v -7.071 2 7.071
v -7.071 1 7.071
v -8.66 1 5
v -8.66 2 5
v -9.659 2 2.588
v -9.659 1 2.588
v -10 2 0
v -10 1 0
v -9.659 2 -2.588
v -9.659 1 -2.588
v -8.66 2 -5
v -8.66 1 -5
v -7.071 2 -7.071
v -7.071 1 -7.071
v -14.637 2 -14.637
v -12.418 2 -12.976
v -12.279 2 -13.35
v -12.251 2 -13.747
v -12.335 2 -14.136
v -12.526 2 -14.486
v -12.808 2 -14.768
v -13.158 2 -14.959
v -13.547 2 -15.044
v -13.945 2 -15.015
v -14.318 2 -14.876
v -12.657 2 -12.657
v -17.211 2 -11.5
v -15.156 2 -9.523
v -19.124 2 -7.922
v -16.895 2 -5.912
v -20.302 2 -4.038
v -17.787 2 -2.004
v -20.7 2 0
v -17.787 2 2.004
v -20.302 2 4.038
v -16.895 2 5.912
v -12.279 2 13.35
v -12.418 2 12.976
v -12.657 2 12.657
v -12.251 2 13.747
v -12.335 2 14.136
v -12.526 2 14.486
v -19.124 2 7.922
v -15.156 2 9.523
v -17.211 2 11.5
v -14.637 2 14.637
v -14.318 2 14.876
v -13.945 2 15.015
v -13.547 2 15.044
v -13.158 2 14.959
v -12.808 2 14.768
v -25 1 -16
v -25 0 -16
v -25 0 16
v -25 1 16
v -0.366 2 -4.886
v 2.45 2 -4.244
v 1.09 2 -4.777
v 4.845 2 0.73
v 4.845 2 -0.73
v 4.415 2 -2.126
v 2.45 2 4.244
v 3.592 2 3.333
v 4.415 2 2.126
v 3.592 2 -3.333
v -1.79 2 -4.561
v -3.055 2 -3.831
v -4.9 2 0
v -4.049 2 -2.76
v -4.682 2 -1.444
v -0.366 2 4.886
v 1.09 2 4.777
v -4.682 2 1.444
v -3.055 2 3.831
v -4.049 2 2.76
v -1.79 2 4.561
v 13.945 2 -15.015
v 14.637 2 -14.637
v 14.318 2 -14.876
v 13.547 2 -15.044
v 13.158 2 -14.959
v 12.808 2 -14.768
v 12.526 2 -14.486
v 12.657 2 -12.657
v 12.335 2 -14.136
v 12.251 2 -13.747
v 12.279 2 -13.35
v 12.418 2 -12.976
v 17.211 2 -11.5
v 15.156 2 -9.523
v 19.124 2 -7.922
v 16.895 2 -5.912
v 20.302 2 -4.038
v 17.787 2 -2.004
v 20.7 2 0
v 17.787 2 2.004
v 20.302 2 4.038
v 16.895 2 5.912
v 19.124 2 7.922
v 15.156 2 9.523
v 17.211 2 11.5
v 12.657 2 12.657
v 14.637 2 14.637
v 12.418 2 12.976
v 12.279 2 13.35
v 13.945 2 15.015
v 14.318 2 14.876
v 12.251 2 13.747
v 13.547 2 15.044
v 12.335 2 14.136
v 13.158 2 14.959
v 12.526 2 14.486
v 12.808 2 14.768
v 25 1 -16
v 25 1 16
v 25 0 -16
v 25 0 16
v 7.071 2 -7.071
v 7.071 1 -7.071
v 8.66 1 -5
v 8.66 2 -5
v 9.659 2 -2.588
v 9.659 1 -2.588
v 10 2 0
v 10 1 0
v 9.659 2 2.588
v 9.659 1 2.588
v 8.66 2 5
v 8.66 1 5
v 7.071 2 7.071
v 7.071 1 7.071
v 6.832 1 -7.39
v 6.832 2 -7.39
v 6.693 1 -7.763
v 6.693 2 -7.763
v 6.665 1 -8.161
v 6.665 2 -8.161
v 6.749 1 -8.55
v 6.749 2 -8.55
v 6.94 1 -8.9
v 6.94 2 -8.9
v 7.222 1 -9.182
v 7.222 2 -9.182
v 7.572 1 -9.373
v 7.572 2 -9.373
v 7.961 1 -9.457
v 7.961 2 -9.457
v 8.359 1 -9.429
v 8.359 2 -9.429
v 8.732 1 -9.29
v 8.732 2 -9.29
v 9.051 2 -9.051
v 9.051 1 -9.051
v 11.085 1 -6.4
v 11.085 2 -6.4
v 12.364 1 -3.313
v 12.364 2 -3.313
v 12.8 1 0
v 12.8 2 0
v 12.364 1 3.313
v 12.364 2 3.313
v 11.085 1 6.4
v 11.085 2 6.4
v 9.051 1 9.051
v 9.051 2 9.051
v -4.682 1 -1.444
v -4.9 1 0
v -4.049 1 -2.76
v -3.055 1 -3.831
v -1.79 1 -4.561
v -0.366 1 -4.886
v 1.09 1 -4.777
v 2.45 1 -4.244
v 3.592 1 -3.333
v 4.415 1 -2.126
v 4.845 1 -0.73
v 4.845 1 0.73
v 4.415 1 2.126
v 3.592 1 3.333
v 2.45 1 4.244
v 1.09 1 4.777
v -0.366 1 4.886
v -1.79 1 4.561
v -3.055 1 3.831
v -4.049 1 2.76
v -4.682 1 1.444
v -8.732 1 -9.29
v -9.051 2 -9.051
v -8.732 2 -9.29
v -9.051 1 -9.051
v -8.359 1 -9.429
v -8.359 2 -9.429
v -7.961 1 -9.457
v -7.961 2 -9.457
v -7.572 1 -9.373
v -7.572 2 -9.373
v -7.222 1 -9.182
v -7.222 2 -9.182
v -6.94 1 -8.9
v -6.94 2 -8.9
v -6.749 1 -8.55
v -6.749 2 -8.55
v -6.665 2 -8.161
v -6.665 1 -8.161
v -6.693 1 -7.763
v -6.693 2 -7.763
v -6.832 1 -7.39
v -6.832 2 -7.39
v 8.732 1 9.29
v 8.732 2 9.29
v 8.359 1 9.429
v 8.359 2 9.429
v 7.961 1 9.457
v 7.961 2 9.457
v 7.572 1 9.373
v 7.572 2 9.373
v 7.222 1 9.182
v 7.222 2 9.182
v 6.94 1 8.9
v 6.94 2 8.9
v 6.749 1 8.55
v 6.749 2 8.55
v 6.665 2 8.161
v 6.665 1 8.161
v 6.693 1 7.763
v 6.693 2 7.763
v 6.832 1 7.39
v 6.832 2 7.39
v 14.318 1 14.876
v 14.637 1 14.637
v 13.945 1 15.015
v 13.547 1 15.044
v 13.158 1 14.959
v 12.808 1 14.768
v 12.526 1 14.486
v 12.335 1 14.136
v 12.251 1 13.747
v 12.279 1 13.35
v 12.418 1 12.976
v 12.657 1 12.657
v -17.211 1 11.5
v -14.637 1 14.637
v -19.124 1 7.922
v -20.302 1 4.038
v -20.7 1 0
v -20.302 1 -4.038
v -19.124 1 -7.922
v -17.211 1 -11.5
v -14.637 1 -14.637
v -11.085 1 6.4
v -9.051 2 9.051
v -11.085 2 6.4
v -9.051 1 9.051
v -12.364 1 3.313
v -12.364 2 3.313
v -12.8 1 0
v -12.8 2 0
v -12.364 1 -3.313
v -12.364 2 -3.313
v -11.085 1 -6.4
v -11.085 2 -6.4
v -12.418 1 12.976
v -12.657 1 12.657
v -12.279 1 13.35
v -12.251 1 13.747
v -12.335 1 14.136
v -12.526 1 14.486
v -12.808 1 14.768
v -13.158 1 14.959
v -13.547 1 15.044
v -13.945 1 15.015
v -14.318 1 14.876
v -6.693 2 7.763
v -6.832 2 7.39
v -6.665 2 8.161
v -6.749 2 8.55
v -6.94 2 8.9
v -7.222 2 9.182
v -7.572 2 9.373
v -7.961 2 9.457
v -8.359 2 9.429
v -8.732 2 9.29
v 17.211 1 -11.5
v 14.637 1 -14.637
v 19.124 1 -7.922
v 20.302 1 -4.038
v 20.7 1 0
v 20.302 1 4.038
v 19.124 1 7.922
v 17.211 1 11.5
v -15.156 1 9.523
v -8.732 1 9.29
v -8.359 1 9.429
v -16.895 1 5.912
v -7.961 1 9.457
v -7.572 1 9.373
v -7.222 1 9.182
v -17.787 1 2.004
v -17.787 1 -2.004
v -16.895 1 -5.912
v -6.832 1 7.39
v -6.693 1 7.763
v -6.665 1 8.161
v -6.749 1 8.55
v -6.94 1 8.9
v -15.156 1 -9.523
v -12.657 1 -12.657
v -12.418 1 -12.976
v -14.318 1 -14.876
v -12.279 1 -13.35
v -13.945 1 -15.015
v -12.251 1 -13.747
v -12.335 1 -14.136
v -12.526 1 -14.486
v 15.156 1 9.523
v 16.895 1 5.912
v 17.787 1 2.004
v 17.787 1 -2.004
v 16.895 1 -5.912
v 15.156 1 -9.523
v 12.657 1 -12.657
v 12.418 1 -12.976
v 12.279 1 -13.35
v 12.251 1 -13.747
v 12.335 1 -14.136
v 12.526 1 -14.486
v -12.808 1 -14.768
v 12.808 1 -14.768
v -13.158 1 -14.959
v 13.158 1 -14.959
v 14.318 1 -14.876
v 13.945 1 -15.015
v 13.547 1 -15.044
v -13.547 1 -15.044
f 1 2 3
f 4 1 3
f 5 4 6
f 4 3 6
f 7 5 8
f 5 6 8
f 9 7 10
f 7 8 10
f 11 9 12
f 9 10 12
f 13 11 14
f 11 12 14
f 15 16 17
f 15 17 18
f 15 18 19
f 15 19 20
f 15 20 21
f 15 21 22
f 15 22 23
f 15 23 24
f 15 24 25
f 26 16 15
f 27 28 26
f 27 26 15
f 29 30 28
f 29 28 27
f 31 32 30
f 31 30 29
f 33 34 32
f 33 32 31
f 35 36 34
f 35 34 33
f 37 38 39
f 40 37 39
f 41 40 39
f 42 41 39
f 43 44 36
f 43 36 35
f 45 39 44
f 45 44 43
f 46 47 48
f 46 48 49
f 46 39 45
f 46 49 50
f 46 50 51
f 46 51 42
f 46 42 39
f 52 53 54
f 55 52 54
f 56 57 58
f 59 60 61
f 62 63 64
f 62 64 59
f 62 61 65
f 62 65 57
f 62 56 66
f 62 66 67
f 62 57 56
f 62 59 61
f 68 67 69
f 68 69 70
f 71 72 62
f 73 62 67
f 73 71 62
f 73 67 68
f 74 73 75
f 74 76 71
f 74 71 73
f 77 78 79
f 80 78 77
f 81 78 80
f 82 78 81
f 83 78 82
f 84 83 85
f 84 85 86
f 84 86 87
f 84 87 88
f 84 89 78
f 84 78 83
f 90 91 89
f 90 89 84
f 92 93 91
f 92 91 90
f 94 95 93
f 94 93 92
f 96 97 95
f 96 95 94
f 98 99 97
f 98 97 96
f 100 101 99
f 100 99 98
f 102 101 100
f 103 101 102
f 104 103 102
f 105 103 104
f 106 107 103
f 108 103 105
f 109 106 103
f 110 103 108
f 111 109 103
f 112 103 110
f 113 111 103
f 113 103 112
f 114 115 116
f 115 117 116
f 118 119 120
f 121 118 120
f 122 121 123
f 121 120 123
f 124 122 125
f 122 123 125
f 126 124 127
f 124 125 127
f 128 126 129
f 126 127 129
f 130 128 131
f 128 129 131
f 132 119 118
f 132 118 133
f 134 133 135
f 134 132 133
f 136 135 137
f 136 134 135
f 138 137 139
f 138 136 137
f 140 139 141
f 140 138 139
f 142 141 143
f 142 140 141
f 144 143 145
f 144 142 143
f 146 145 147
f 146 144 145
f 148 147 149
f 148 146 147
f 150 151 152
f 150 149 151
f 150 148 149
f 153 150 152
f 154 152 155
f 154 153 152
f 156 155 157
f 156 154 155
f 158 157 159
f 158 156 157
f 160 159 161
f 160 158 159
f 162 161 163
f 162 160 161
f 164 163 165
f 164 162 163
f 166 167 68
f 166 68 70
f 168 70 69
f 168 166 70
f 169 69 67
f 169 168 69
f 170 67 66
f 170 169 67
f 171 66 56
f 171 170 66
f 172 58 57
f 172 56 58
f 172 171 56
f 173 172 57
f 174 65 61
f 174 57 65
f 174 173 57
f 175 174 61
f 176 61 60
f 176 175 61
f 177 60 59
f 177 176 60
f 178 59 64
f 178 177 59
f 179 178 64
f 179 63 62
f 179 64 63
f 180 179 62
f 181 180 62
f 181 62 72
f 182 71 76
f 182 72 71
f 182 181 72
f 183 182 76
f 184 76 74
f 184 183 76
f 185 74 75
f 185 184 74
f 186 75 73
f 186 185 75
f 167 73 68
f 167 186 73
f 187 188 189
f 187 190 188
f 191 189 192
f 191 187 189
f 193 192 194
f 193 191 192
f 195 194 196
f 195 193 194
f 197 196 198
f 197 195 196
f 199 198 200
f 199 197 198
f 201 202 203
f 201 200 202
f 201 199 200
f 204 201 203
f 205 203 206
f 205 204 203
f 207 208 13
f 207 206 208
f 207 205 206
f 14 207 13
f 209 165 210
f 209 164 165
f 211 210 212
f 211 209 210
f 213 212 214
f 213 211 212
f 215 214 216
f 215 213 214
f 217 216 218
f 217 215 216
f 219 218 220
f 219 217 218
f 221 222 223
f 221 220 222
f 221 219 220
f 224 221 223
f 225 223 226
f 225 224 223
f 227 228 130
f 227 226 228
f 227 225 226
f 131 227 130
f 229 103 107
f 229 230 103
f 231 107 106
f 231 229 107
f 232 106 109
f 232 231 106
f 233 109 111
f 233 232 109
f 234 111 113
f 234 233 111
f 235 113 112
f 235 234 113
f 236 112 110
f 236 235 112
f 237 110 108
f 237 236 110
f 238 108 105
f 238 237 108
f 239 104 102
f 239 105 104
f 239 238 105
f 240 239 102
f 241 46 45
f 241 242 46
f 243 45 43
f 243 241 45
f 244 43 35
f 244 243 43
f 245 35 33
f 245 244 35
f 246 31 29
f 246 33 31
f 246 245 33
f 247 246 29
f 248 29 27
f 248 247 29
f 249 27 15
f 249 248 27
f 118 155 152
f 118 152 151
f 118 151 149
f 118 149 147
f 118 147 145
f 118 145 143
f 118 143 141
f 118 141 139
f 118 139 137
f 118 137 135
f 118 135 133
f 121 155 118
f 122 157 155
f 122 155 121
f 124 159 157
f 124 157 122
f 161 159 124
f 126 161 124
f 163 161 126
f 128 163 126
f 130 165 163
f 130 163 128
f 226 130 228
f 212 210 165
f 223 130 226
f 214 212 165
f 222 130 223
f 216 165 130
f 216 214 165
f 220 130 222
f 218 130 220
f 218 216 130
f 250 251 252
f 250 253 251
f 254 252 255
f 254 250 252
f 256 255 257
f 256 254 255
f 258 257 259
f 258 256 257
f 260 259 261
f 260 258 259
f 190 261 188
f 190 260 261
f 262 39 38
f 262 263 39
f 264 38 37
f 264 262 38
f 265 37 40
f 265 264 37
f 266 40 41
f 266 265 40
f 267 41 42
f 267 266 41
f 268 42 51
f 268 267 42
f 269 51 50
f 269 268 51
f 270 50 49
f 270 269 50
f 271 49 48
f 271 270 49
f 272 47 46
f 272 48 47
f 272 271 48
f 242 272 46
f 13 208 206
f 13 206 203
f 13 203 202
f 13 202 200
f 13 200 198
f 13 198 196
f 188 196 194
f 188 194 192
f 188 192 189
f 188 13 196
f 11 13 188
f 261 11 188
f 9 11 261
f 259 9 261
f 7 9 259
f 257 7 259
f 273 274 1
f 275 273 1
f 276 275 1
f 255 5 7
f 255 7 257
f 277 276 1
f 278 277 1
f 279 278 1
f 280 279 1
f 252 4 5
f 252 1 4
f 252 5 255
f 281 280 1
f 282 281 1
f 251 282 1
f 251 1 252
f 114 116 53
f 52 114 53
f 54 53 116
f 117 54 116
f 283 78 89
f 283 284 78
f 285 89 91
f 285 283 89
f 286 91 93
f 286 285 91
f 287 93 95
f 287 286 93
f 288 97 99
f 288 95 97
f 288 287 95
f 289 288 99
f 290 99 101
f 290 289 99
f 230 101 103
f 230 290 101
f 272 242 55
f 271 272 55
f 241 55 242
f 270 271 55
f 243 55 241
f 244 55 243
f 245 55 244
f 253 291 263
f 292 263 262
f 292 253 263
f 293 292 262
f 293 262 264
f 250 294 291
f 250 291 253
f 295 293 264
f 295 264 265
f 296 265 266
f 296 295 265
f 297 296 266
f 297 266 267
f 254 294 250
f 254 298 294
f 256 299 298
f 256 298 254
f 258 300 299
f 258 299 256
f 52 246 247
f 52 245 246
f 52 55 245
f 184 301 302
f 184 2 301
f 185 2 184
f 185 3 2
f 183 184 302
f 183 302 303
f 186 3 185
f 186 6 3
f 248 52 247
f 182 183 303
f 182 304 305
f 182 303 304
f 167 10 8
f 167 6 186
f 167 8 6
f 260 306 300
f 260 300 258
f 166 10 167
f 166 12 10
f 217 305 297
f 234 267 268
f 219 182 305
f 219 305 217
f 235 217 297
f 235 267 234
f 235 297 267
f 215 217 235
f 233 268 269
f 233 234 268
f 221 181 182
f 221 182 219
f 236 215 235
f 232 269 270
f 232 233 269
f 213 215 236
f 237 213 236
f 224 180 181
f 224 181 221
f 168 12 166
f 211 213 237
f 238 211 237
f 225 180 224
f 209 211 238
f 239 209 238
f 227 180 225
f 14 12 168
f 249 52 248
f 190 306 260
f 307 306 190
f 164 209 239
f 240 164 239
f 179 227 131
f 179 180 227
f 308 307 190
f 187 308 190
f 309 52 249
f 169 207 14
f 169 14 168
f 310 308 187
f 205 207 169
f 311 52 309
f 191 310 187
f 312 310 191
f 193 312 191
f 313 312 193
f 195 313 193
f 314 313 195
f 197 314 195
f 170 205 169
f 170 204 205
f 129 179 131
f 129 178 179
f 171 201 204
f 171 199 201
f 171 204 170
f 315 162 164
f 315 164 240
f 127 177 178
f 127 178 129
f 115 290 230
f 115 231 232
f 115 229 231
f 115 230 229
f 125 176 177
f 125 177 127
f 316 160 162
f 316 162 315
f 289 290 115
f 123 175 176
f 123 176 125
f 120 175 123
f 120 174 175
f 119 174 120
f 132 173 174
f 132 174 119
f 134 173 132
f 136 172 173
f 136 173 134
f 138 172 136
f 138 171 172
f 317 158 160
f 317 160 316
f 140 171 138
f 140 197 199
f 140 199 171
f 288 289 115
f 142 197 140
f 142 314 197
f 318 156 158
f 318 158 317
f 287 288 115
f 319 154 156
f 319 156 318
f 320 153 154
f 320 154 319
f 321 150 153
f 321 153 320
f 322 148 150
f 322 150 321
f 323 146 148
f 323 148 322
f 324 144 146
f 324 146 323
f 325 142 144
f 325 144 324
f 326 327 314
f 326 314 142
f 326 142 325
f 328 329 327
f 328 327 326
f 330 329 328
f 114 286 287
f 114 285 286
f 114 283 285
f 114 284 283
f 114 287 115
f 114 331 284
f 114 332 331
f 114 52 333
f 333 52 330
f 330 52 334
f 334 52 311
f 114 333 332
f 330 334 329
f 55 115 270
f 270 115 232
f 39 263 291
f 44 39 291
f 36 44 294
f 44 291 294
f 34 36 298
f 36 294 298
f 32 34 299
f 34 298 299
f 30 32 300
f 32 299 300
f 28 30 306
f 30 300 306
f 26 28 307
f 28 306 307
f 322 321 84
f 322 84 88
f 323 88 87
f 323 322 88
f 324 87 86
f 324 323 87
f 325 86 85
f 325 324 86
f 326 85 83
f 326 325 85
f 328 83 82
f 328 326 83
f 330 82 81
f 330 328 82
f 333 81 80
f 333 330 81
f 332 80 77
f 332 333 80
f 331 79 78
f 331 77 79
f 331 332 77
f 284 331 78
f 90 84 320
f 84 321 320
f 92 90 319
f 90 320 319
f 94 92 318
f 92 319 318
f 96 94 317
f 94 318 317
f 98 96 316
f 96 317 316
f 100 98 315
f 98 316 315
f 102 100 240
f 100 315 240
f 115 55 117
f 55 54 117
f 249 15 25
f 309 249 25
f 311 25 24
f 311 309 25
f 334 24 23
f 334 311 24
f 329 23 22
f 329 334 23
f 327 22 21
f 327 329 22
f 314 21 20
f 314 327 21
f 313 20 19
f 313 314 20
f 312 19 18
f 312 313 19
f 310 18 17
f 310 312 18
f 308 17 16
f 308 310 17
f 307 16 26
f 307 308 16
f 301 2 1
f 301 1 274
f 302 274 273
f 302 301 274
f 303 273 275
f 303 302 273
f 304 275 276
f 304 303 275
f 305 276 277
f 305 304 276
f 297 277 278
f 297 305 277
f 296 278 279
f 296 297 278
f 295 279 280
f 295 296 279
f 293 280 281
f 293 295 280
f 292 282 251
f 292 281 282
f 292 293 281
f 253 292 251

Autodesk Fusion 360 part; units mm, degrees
sketch "Skizze1" plane through (0, 0, 0) normal (0, 1, 0) x (1, 0, 0)
  line L0 (25, 16) -> (-25, 16)
  line L1 (-25, 16) -> (-25, -16)
  line L2 (-25, -16) -> (25, -16)
  line L3 (25, -16) -> (25, 16)
  line L4 (25, 16) -> (-25, -16) construction
  line L5 (-25, 16) -> (25, -16) construction
  dimension "d1" = 50
  dimension "d2" = 32
extrude "Extrusion1" add sketch "Skizze1" along normal blind 1
sketch "Skizze2" plane through (0, 1, 0) normal (0, 1, 0) x (-1, 0, 0)
  line L0 (-25, 16) -> (-25, -16)
  line L1 (-25, -16) -> (25, -16)
  line L2 (25, -16) -> (25, 16)
  line L3 (25, 16) -> (-25, 16)
  circle A0 centre (0, 0) radius 4.9
  line L4 (0, 0) -> (0, -16) construction
  line L5 (0, 0) -> (-14.6371, -14.6371) construction
  line L6 (0, 0) -> (-14.6371, 14.6371) construction
  arc A1 (-7.0711, 7.0711) -> (-9.051, 9.051) centre (-8.061, 8.061) ccw
  arc A2 (-12.6572, 12.6572) -> (-14.6371, 14.6371) centre (-13.6472, 13.6472) ccw
  arc A3 (-9.051, 9.051) -> (-9.051, -9.051) centre (0, 0) ccw
  arc A4 (-7.0711, 7.0711) -> (-7.0711, -7.0711) centre (0, 0) ccw
  arc A5 (-14.6371, -14.6371) -> (-12.6572, -12.6572) centre (-13.6472, -13.6472) ccw
  arc A6 (-9.051, -9.051) -> (-7.0711, -7.0711) centre (-8.061, -8.061) ccw
  arc A7 (-12.6572, 12.6572) -> (-12.6572, -12.6572) centre (0, 0) ccw
  arc A8 (-14.6371, 14.6371) -> (-14.6371, -14.6371) centre (0, 0) ccw
  arc A9 (12.6572, -12.6572) -> (12.6572, 12.6572) centre (0, 0) ccw
  arc A10 (14.6371, -14.6371) -> (14.6371, 14.6371) centre (0, 0) ccw
  line L7 (25, 16) -> (25, -16)
  line L8 (0, 0) -> (14.6371, 14.6371) construction
  line L9 (25, -16) -> (-25, -16)
  arc A11 (9.051, -9.051) -> (9.051, 9.051) centre (0, 0) ccw
  arc A12 (12.6572, -12.6572) -> (14.6371, -14.6371) centre (13.6472, -13.6472) ccw
  arc A13 (7.0711, -7.0711) -> (7.0711, 7.0711) centre (0, 0) ccw
  line L10 (0, 0) -> (14.6371, -14.6371) construction
  arc A14 (9.051, 9.051) -> (7.0711, 7.0711) centre (8.061, 8.061) ccw
  line L11 (-25, 16) -> (25, 16)
  arc A15 (7.0711, -7.0711) -> (9.051, -9.051) centre (8.061, -8.061) ccw
  arc A16 (14.6371, 14.6371) -> (12.6572, 12.6572) centre (13.6472, 13.6472) ccw
  dimension "d6" = 9.8
  dimension "d7" = 2.8
  dimension "d8" = 5.1
  dimension "d9" = 5.1
  dimension "d10" = 2.8
  dimension "d11" = 45
extrude "Extrusion2" add sketch "Skizze2" along normal blind 1 contours A0 | A1 A3 A4 A6 | A2 A5 A7 A8 | A9 A10 A12 A16 | A11 A13 A14 A15
equation "d9 = d8"
equation "d10 = d7"
